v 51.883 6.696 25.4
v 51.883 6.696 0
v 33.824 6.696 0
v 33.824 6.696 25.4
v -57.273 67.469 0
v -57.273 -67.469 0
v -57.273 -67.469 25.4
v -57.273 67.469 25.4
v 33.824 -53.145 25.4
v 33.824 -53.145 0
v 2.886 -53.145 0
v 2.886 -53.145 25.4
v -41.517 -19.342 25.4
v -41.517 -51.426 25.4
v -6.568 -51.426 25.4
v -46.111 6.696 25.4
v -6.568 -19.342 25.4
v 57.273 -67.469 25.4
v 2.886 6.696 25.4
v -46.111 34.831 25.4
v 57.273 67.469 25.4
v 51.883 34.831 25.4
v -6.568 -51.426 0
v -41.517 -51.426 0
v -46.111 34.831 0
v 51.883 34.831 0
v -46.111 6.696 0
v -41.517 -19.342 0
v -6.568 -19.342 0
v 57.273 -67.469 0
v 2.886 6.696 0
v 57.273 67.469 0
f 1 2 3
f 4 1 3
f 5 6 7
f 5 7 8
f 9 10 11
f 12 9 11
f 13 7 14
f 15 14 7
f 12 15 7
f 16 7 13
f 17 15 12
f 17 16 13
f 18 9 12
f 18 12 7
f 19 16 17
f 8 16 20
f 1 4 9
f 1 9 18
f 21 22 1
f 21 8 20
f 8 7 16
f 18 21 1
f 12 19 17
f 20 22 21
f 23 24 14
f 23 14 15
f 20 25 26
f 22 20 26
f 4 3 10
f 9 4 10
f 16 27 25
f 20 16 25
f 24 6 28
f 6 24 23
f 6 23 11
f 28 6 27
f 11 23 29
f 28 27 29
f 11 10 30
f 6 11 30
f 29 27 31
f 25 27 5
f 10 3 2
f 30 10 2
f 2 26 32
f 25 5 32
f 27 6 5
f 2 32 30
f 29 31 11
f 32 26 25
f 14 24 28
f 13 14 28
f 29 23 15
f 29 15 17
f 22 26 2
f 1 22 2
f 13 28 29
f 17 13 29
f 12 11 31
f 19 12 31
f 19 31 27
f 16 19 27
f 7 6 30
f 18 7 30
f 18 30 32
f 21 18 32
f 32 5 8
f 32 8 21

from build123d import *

# Parameters (mm, degrees)
F0_W     = 114.545062
F0_H     = 134.937272
F0_W_2   = 34.949101
F0_H_2   = 32.08442
F1_DEPTH = 25.4


with BuildPart() as f1:
    # F0 (on Top) → F1 (new body)
    with BuildSketch(Plane.XY):
        Rectangle(F0_W, F0_H)
        with Locations((-24.042237, -35.384219)):
            Rectangle(F0_W_2, F0_H_2, mode=Mode.SUBTRACT)
        Polygon((33.824306, -53.145237), (2.885755, -53.145237), (2.885755, 6.695721), (-46.111111, 6.695721), (-46.111111, 34.831312), (51.882621, 34.831312), (51.882621, 6.695721), (33.824306, 6.695721), align=None, mode=Mode.SUBTRACT)
    extrude(amount=F1_DEPTH)


solid = f1.part
